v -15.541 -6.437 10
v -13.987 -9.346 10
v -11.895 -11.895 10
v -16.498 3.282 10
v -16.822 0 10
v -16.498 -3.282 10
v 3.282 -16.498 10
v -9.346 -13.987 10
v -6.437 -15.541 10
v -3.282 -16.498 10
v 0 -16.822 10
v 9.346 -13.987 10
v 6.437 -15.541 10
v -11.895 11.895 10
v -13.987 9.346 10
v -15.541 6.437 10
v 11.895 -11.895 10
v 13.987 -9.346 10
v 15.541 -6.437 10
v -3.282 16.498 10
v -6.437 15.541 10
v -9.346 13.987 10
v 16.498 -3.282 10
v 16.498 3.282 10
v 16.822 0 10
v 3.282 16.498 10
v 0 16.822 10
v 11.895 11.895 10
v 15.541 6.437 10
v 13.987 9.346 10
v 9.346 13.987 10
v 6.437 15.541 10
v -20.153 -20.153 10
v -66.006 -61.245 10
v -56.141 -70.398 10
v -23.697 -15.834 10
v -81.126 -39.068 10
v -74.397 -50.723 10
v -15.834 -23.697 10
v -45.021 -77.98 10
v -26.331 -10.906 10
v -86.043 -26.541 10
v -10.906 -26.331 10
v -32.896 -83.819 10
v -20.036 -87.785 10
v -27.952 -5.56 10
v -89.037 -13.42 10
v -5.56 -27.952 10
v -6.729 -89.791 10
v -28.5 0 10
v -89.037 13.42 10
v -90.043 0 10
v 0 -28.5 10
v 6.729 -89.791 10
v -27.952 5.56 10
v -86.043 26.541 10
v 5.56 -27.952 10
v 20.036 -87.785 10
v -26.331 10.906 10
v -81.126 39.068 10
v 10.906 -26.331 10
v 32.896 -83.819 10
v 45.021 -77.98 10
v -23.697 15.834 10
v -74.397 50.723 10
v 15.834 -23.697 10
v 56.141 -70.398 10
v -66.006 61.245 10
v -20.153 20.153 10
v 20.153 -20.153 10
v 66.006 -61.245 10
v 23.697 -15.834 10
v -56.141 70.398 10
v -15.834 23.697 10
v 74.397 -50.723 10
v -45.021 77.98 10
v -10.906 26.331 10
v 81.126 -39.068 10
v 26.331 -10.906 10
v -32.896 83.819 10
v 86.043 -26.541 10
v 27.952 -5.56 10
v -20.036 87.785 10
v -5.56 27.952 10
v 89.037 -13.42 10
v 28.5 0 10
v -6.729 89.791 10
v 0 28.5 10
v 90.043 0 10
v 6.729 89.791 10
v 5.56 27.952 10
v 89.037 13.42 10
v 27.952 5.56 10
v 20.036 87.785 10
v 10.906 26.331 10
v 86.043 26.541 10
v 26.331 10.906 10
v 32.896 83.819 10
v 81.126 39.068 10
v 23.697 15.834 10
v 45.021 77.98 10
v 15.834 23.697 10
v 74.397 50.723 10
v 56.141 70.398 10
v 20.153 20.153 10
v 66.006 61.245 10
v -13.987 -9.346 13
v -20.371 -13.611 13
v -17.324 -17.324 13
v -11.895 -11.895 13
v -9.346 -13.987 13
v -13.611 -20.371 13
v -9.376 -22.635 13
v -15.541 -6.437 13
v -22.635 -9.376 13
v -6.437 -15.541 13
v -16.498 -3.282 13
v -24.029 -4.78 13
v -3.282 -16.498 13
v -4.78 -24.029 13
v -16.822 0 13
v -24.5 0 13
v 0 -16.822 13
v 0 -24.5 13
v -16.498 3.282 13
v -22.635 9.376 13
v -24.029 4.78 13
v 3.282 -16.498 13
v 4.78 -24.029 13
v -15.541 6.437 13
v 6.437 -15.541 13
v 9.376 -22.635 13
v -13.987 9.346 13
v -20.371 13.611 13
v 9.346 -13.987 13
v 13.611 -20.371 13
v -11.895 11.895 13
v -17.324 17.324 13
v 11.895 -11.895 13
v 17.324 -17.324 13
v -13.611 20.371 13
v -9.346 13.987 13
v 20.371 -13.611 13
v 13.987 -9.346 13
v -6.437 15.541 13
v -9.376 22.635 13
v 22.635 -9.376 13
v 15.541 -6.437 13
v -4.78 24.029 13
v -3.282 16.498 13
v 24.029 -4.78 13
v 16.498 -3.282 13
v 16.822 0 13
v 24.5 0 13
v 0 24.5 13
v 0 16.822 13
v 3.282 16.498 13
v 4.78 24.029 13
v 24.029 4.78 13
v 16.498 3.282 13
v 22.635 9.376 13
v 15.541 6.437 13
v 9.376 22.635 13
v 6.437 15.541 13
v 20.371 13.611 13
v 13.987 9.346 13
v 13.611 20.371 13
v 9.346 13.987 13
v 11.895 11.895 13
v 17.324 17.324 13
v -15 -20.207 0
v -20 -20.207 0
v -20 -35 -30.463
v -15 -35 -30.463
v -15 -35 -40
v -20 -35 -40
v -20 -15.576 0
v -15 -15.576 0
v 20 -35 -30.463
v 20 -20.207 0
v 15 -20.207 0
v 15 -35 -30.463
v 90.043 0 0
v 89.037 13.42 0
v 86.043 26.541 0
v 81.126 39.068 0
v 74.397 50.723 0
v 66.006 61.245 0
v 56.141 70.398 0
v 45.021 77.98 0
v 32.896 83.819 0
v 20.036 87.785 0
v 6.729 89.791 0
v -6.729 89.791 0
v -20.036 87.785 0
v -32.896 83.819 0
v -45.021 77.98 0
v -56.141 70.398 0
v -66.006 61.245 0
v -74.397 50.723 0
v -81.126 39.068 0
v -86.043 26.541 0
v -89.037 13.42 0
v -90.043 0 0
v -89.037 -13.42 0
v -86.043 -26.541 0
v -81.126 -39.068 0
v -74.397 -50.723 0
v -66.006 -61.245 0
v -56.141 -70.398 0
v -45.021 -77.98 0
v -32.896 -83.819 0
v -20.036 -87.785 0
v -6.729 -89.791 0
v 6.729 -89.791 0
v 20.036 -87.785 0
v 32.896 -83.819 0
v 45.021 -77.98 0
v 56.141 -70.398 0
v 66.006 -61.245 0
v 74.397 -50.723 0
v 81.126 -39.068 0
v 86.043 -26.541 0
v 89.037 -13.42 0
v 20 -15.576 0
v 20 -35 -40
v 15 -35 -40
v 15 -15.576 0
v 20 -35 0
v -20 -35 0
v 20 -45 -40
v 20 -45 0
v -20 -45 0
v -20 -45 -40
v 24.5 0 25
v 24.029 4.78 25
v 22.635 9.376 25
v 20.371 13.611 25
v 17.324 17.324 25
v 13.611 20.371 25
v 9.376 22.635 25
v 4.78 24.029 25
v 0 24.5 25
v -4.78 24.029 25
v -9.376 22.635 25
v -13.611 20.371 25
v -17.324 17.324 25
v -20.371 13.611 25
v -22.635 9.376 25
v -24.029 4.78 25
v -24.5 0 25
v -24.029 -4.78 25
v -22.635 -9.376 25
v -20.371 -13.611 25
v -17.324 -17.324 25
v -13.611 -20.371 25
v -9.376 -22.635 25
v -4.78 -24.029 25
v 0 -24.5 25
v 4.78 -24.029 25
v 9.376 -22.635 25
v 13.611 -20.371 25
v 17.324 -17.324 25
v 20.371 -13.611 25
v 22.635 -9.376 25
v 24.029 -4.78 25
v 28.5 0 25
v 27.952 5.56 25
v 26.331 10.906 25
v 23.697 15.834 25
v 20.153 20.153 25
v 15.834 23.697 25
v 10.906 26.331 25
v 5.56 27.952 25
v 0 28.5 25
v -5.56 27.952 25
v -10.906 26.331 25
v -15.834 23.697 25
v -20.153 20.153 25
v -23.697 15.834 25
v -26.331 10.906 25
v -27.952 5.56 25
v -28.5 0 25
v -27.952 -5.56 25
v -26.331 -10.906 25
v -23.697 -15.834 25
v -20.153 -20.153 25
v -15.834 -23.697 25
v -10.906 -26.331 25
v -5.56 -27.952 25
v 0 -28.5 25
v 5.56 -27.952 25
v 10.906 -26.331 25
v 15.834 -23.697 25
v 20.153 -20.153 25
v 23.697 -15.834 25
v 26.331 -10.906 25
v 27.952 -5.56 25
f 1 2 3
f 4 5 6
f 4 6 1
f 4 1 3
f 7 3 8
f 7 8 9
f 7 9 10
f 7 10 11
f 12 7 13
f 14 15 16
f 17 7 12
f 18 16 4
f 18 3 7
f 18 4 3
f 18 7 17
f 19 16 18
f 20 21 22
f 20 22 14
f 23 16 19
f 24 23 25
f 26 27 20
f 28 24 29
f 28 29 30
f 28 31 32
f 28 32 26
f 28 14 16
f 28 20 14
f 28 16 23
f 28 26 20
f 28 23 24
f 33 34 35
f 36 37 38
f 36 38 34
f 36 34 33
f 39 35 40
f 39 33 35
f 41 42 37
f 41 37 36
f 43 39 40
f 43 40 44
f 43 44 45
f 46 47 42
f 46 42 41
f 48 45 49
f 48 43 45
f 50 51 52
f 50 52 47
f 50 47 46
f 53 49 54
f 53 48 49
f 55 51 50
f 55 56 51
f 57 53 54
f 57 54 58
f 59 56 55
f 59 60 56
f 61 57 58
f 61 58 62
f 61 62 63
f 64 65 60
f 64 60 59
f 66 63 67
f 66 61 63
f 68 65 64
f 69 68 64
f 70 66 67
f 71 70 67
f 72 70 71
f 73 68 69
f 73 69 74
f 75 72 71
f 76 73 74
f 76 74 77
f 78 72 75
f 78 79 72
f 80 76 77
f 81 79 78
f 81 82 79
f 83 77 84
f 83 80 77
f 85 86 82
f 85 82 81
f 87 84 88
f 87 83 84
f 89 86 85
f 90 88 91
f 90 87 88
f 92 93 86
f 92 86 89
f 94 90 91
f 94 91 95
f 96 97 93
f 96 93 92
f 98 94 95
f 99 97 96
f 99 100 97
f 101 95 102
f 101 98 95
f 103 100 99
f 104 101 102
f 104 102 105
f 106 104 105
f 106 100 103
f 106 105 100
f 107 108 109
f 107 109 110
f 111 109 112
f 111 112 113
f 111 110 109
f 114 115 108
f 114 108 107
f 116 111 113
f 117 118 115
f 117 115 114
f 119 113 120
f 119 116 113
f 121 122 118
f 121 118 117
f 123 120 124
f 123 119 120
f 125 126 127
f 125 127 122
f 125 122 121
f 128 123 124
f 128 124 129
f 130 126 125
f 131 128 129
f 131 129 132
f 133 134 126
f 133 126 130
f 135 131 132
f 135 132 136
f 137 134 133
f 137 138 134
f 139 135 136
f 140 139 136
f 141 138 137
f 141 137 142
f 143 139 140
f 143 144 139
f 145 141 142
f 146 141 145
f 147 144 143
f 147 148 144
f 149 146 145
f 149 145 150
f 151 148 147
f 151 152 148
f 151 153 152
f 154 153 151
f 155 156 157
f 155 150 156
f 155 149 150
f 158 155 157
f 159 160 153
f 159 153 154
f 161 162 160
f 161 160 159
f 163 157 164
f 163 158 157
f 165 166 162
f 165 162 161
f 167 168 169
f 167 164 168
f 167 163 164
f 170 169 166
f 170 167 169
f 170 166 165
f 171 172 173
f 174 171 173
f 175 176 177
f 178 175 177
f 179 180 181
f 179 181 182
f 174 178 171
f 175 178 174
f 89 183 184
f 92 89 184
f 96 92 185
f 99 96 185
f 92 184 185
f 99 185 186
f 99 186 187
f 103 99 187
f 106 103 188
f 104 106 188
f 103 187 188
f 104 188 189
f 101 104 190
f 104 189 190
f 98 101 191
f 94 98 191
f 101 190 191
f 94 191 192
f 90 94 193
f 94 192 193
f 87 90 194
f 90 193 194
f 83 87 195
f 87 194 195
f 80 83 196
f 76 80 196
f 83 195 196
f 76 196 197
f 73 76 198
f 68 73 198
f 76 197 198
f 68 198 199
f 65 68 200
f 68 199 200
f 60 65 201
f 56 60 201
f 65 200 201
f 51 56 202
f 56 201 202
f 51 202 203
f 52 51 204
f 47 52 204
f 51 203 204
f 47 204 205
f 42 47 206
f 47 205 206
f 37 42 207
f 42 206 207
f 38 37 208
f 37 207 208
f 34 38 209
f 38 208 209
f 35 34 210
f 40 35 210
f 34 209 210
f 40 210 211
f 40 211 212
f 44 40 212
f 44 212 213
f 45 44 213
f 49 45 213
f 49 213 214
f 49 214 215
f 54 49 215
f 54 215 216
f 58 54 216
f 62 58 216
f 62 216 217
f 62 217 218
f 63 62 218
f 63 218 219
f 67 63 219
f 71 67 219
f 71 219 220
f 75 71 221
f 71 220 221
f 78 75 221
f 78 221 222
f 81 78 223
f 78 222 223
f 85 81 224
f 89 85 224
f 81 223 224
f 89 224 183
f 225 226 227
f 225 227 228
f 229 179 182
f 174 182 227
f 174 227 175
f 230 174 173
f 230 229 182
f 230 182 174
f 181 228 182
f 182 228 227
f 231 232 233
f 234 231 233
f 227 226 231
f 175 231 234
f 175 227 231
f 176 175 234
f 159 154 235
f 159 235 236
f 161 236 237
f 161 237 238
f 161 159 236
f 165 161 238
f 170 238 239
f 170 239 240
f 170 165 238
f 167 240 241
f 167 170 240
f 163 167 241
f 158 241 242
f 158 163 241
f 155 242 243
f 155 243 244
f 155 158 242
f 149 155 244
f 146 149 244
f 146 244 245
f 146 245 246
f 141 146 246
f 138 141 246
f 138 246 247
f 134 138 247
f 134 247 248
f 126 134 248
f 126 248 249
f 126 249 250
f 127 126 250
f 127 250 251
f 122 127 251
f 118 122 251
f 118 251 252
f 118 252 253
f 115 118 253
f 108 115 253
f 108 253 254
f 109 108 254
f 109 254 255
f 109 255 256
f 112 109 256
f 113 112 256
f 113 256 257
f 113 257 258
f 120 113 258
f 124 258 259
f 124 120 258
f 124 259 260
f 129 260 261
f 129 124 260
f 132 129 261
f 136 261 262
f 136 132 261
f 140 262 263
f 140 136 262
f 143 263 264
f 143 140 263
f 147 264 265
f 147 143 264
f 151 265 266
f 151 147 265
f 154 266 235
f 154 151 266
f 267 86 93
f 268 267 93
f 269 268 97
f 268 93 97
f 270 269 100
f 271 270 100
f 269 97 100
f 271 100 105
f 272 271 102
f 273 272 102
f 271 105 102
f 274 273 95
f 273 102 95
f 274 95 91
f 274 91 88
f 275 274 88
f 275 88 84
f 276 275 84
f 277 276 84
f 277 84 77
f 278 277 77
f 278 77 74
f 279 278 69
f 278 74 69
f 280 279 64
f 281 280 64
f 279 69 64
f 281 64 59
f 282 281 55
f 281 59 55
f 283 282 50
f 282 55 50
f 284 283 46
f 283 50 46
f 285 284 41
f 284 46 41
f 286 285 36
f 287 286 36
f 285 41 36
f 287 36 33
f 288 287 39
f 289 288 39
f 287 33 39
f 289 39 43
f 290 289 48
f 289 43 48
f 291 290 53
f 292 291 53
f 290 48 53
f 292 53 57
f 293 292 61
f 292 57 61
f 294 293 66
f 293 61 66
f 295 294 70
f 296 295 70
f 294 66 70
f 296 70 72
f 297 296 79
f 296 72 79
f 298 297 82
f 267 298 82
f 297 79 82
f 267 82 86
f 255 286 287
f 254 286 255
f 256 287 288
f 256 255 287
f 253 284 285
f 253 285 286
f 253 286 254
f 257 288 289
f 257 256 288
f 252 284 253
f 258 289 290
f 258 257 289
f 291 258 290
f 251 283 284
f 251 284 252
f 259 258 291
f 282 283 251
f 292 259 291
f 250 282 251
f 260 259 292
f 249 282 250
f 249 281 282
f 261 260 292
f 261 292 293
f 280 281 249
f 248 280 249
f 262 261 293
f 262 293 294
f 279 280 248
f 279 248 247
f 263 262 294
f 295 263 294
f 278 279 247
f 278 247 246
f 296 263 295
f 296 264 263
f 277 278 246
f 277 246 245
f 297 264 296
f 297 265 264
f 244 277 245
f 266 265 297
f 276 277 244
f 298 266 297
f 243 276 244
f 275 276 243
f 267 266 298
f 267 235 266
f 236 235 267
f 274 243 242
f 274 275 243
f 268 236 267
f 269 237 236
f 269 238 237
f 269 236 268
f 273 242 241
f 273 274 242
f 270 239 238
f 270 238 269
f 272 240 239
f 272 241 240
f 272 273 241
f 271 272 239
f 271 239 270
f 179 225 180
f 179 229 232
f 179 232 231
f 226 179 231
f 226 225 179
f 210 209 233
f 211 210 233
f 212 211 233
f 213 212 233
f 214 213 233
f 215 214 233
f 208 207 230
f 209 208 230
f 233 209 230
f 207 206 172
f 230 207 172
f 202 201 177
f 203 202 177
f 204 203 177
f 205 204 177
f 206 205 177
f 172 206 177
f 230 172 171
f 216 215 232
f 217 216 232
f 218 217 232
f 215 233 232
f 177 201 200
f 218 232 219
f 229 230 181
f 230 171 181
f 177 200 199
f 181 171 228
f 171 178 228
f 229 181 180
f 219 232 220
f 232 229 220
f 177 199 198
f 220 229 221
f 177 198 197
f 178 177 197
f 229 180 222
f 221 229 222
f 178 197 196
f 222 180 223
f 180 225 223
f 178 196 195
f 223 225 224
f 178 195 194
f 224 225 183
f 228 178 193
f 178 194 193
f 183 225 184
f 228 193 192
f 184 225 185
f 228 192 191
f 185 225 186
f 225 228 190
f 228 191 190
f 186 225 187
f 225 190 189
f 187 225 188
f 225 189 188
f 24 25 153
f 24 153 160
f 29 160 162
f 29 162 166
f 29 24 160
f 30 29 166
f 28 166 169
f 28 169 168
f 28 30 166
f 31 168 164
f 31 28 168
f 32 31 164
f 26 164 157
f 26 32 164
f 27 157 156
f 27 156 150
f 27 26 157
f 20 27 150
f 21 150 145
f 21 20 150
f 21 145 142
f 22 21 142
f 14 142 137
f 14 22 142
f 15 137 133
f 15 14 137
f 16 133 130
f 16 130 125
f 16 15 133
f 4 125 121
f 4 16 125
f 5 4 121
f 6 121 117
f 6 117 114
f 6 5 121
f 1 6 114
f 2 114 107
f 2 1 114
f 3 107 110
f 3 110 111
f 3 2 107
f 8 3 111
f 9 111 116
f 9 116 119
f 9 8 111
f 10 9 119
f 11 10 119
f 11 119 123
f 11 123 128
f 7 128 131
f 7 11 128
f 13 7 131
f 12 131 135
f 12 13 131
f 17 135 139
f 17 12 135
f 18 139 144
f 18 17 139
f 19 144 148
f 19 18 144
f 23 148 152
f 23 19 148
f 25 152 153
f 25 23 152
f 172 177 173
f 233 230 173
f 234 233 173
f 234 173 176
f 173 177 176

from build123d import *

# Parameters (mm, degrees)
SKETCH1_R           = 90.043
BOSS_EXTRUDE1_DEPTH = 10
SKETCH3_W           = 40
SKETCH3_H           = 10
BOSS_EXTRUDE2_DEPTH = 40
BOSS_EXTRUDE5_DEPTH = 5
SKETCH5_R           = 28.5
SKETCH5_R_2         = 24.5
BOSS_EXTRUDE6_DEPTH = 15
SKETCH6_R           = 24.5
SKETCH6_R_2         = 16.821657313
BOSS_EXTRUDE7_DEPTH = 3


with BuildPart() as part:
    # Sketch1 → Boss-Extrude1 (new body)
    with BuildSketch(Plane.XY):
        Circle(SKETCH1_R)
    extrude(amount=BOSS_EXTRUDE1_DEPTH)

    # Sketch3 → Boss-Extrude2 (add)
    with BuildSketch(Plane(origin=(0, 0, 0), x_dir=(-1, 0, 0), z_dir=(0, 0, -1))):
        with Locations((0, -40)):
            Rectangle(SKETCH3_W, SKETCH3_H)
    extrude(amount=BOSS_EXTRUDE2_DEPTH)

    # Sketch4 → Boss-Extrude5 (add)
    with BuildSketch(Plane.ZY.offset(20)):
        Polygon((-40, -35), (0, -15.575750454), (0, -20.206895082), (-30.463169004, -35), align=None)
    boss_extrude5 = extrude(amount=-BOSS_EXTRUDE5_DEPTH)

    # Mirror1: Boss-Extrude5 across plane
    add(boss_extrude5.mirror(Plane(origin=(0, 0, 0), x_dir=(0, 0, 1), z_dir=(1, 0, 0))))

    # Sketch5 → Boss-Extrude6 (add)
    with BuildSketch(Plane.XY.offset(10)):
        Circle(SKETCH5_R)
        Circle(SKETCH5_R_2, mode=Mode.SUBTRACT)
    extrude(amount=BOSS_EXTRUDE6_DEPTH)

    # Sketch6 → Boss-Extrude7 (add)
    with BuildSketch(Plane.XY.offset(10)):
        Circle(SKETCH6_R)
        Circle(SKETCH6_R_2, mode=Mode.SUBTRACT)
    extrude(amount=BOSS_EXTRUDE7_DEPTH)


solid = part.part
